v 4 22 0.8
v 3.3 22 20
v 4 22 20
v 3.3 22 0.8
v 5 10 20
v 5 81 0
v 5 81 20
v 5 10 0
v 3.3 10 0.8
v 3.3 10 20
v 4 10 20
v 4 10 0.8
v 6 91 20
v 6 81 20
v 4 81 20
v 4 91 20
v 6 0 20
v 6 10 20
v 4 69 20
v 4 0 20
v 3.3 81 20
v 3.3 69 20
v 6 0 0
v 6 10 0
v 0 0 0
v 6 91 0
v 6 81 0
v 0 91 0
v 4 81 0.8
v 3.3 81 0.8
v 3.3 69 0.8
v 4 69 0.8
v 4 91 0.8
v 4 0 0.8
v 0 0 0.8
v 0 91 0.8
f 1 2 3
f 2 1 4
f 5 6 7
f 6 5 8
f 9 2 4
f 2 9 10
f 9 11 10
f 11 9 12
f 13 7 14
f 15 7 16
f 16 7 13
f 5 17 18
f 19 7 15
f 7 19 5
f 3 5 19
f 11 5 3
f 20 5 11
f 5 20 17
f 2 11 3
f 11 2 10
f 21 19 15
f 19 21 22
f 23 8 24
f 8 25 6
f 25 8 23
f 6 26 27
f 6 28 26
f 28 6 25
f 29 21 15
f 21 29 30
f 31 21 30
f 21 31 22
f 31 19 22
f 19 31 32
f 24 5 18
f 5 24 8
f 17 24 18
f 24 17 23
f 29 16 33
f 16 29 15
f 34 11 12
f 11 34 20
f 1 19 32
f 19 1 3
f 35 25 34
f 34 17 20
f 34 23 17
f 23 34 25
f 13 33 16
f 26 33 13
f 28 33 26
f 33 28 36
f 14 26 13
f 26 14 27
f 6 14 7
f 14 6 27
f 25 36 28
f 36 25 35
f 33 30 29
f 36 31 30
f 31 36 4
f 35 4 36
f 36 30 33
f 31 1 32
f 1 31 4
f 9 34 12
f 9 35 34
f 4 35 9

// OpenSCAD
// Strip that sits between a DDR pad's L-bracket (top) and sensor (bottom),
// with bottom pads to reduce sensor contact area, top outer stops to keep it
// from shifting under the L-bracket, and a downward side lip that tucks into
// the sensor crevice and doubles as a built-in brim when printed on edge.

// all constants are in mm

bracket_width = 71;
strip_len = 20;
base_thickness = 1;

pad_width = 12;
pad_thickness = 1.7;

stop_width = 10;
stop_thickness = 2;

lip_depth = 4;
lip_thickness = 0.8;

total_width = bracket_width + 2 * stop_width;
base_z = lip_depth;

// rotated for printing: standing on the lip edge (Z = 0..20), 91 mm along Y
rotate([90, 0, 90]) {
	union() {
		// main strip; top sits flush against the underside of the L-bracket
		translate([0, 0, base_z]) {
			cube([total_width, strip_len, base_thickness]);
		}
		// bottom pads pressing down onto the sensor
		for (x = [stop_width, total_width - stop_width - pad_width]) {
			translate([x, 0, base_z + base_thickness - pad_thickness]) {
				cube([pad_width, strip_len, pad_thickness]);
			}
		}
		// top outer stops cradling both ends of the L-bracket
		for (x = [0, total_width - stop_width]) {
			translate([x, 0, base_z]) {
				cube([stop_width, strip_len, stop_thickness]);
			}
		}
		// downward side lip into sensor crevice (print-bed base at Z = 0..0.8)
		cube([total_width, lip_thickness, base_z + base_thickness]);
	}
}
